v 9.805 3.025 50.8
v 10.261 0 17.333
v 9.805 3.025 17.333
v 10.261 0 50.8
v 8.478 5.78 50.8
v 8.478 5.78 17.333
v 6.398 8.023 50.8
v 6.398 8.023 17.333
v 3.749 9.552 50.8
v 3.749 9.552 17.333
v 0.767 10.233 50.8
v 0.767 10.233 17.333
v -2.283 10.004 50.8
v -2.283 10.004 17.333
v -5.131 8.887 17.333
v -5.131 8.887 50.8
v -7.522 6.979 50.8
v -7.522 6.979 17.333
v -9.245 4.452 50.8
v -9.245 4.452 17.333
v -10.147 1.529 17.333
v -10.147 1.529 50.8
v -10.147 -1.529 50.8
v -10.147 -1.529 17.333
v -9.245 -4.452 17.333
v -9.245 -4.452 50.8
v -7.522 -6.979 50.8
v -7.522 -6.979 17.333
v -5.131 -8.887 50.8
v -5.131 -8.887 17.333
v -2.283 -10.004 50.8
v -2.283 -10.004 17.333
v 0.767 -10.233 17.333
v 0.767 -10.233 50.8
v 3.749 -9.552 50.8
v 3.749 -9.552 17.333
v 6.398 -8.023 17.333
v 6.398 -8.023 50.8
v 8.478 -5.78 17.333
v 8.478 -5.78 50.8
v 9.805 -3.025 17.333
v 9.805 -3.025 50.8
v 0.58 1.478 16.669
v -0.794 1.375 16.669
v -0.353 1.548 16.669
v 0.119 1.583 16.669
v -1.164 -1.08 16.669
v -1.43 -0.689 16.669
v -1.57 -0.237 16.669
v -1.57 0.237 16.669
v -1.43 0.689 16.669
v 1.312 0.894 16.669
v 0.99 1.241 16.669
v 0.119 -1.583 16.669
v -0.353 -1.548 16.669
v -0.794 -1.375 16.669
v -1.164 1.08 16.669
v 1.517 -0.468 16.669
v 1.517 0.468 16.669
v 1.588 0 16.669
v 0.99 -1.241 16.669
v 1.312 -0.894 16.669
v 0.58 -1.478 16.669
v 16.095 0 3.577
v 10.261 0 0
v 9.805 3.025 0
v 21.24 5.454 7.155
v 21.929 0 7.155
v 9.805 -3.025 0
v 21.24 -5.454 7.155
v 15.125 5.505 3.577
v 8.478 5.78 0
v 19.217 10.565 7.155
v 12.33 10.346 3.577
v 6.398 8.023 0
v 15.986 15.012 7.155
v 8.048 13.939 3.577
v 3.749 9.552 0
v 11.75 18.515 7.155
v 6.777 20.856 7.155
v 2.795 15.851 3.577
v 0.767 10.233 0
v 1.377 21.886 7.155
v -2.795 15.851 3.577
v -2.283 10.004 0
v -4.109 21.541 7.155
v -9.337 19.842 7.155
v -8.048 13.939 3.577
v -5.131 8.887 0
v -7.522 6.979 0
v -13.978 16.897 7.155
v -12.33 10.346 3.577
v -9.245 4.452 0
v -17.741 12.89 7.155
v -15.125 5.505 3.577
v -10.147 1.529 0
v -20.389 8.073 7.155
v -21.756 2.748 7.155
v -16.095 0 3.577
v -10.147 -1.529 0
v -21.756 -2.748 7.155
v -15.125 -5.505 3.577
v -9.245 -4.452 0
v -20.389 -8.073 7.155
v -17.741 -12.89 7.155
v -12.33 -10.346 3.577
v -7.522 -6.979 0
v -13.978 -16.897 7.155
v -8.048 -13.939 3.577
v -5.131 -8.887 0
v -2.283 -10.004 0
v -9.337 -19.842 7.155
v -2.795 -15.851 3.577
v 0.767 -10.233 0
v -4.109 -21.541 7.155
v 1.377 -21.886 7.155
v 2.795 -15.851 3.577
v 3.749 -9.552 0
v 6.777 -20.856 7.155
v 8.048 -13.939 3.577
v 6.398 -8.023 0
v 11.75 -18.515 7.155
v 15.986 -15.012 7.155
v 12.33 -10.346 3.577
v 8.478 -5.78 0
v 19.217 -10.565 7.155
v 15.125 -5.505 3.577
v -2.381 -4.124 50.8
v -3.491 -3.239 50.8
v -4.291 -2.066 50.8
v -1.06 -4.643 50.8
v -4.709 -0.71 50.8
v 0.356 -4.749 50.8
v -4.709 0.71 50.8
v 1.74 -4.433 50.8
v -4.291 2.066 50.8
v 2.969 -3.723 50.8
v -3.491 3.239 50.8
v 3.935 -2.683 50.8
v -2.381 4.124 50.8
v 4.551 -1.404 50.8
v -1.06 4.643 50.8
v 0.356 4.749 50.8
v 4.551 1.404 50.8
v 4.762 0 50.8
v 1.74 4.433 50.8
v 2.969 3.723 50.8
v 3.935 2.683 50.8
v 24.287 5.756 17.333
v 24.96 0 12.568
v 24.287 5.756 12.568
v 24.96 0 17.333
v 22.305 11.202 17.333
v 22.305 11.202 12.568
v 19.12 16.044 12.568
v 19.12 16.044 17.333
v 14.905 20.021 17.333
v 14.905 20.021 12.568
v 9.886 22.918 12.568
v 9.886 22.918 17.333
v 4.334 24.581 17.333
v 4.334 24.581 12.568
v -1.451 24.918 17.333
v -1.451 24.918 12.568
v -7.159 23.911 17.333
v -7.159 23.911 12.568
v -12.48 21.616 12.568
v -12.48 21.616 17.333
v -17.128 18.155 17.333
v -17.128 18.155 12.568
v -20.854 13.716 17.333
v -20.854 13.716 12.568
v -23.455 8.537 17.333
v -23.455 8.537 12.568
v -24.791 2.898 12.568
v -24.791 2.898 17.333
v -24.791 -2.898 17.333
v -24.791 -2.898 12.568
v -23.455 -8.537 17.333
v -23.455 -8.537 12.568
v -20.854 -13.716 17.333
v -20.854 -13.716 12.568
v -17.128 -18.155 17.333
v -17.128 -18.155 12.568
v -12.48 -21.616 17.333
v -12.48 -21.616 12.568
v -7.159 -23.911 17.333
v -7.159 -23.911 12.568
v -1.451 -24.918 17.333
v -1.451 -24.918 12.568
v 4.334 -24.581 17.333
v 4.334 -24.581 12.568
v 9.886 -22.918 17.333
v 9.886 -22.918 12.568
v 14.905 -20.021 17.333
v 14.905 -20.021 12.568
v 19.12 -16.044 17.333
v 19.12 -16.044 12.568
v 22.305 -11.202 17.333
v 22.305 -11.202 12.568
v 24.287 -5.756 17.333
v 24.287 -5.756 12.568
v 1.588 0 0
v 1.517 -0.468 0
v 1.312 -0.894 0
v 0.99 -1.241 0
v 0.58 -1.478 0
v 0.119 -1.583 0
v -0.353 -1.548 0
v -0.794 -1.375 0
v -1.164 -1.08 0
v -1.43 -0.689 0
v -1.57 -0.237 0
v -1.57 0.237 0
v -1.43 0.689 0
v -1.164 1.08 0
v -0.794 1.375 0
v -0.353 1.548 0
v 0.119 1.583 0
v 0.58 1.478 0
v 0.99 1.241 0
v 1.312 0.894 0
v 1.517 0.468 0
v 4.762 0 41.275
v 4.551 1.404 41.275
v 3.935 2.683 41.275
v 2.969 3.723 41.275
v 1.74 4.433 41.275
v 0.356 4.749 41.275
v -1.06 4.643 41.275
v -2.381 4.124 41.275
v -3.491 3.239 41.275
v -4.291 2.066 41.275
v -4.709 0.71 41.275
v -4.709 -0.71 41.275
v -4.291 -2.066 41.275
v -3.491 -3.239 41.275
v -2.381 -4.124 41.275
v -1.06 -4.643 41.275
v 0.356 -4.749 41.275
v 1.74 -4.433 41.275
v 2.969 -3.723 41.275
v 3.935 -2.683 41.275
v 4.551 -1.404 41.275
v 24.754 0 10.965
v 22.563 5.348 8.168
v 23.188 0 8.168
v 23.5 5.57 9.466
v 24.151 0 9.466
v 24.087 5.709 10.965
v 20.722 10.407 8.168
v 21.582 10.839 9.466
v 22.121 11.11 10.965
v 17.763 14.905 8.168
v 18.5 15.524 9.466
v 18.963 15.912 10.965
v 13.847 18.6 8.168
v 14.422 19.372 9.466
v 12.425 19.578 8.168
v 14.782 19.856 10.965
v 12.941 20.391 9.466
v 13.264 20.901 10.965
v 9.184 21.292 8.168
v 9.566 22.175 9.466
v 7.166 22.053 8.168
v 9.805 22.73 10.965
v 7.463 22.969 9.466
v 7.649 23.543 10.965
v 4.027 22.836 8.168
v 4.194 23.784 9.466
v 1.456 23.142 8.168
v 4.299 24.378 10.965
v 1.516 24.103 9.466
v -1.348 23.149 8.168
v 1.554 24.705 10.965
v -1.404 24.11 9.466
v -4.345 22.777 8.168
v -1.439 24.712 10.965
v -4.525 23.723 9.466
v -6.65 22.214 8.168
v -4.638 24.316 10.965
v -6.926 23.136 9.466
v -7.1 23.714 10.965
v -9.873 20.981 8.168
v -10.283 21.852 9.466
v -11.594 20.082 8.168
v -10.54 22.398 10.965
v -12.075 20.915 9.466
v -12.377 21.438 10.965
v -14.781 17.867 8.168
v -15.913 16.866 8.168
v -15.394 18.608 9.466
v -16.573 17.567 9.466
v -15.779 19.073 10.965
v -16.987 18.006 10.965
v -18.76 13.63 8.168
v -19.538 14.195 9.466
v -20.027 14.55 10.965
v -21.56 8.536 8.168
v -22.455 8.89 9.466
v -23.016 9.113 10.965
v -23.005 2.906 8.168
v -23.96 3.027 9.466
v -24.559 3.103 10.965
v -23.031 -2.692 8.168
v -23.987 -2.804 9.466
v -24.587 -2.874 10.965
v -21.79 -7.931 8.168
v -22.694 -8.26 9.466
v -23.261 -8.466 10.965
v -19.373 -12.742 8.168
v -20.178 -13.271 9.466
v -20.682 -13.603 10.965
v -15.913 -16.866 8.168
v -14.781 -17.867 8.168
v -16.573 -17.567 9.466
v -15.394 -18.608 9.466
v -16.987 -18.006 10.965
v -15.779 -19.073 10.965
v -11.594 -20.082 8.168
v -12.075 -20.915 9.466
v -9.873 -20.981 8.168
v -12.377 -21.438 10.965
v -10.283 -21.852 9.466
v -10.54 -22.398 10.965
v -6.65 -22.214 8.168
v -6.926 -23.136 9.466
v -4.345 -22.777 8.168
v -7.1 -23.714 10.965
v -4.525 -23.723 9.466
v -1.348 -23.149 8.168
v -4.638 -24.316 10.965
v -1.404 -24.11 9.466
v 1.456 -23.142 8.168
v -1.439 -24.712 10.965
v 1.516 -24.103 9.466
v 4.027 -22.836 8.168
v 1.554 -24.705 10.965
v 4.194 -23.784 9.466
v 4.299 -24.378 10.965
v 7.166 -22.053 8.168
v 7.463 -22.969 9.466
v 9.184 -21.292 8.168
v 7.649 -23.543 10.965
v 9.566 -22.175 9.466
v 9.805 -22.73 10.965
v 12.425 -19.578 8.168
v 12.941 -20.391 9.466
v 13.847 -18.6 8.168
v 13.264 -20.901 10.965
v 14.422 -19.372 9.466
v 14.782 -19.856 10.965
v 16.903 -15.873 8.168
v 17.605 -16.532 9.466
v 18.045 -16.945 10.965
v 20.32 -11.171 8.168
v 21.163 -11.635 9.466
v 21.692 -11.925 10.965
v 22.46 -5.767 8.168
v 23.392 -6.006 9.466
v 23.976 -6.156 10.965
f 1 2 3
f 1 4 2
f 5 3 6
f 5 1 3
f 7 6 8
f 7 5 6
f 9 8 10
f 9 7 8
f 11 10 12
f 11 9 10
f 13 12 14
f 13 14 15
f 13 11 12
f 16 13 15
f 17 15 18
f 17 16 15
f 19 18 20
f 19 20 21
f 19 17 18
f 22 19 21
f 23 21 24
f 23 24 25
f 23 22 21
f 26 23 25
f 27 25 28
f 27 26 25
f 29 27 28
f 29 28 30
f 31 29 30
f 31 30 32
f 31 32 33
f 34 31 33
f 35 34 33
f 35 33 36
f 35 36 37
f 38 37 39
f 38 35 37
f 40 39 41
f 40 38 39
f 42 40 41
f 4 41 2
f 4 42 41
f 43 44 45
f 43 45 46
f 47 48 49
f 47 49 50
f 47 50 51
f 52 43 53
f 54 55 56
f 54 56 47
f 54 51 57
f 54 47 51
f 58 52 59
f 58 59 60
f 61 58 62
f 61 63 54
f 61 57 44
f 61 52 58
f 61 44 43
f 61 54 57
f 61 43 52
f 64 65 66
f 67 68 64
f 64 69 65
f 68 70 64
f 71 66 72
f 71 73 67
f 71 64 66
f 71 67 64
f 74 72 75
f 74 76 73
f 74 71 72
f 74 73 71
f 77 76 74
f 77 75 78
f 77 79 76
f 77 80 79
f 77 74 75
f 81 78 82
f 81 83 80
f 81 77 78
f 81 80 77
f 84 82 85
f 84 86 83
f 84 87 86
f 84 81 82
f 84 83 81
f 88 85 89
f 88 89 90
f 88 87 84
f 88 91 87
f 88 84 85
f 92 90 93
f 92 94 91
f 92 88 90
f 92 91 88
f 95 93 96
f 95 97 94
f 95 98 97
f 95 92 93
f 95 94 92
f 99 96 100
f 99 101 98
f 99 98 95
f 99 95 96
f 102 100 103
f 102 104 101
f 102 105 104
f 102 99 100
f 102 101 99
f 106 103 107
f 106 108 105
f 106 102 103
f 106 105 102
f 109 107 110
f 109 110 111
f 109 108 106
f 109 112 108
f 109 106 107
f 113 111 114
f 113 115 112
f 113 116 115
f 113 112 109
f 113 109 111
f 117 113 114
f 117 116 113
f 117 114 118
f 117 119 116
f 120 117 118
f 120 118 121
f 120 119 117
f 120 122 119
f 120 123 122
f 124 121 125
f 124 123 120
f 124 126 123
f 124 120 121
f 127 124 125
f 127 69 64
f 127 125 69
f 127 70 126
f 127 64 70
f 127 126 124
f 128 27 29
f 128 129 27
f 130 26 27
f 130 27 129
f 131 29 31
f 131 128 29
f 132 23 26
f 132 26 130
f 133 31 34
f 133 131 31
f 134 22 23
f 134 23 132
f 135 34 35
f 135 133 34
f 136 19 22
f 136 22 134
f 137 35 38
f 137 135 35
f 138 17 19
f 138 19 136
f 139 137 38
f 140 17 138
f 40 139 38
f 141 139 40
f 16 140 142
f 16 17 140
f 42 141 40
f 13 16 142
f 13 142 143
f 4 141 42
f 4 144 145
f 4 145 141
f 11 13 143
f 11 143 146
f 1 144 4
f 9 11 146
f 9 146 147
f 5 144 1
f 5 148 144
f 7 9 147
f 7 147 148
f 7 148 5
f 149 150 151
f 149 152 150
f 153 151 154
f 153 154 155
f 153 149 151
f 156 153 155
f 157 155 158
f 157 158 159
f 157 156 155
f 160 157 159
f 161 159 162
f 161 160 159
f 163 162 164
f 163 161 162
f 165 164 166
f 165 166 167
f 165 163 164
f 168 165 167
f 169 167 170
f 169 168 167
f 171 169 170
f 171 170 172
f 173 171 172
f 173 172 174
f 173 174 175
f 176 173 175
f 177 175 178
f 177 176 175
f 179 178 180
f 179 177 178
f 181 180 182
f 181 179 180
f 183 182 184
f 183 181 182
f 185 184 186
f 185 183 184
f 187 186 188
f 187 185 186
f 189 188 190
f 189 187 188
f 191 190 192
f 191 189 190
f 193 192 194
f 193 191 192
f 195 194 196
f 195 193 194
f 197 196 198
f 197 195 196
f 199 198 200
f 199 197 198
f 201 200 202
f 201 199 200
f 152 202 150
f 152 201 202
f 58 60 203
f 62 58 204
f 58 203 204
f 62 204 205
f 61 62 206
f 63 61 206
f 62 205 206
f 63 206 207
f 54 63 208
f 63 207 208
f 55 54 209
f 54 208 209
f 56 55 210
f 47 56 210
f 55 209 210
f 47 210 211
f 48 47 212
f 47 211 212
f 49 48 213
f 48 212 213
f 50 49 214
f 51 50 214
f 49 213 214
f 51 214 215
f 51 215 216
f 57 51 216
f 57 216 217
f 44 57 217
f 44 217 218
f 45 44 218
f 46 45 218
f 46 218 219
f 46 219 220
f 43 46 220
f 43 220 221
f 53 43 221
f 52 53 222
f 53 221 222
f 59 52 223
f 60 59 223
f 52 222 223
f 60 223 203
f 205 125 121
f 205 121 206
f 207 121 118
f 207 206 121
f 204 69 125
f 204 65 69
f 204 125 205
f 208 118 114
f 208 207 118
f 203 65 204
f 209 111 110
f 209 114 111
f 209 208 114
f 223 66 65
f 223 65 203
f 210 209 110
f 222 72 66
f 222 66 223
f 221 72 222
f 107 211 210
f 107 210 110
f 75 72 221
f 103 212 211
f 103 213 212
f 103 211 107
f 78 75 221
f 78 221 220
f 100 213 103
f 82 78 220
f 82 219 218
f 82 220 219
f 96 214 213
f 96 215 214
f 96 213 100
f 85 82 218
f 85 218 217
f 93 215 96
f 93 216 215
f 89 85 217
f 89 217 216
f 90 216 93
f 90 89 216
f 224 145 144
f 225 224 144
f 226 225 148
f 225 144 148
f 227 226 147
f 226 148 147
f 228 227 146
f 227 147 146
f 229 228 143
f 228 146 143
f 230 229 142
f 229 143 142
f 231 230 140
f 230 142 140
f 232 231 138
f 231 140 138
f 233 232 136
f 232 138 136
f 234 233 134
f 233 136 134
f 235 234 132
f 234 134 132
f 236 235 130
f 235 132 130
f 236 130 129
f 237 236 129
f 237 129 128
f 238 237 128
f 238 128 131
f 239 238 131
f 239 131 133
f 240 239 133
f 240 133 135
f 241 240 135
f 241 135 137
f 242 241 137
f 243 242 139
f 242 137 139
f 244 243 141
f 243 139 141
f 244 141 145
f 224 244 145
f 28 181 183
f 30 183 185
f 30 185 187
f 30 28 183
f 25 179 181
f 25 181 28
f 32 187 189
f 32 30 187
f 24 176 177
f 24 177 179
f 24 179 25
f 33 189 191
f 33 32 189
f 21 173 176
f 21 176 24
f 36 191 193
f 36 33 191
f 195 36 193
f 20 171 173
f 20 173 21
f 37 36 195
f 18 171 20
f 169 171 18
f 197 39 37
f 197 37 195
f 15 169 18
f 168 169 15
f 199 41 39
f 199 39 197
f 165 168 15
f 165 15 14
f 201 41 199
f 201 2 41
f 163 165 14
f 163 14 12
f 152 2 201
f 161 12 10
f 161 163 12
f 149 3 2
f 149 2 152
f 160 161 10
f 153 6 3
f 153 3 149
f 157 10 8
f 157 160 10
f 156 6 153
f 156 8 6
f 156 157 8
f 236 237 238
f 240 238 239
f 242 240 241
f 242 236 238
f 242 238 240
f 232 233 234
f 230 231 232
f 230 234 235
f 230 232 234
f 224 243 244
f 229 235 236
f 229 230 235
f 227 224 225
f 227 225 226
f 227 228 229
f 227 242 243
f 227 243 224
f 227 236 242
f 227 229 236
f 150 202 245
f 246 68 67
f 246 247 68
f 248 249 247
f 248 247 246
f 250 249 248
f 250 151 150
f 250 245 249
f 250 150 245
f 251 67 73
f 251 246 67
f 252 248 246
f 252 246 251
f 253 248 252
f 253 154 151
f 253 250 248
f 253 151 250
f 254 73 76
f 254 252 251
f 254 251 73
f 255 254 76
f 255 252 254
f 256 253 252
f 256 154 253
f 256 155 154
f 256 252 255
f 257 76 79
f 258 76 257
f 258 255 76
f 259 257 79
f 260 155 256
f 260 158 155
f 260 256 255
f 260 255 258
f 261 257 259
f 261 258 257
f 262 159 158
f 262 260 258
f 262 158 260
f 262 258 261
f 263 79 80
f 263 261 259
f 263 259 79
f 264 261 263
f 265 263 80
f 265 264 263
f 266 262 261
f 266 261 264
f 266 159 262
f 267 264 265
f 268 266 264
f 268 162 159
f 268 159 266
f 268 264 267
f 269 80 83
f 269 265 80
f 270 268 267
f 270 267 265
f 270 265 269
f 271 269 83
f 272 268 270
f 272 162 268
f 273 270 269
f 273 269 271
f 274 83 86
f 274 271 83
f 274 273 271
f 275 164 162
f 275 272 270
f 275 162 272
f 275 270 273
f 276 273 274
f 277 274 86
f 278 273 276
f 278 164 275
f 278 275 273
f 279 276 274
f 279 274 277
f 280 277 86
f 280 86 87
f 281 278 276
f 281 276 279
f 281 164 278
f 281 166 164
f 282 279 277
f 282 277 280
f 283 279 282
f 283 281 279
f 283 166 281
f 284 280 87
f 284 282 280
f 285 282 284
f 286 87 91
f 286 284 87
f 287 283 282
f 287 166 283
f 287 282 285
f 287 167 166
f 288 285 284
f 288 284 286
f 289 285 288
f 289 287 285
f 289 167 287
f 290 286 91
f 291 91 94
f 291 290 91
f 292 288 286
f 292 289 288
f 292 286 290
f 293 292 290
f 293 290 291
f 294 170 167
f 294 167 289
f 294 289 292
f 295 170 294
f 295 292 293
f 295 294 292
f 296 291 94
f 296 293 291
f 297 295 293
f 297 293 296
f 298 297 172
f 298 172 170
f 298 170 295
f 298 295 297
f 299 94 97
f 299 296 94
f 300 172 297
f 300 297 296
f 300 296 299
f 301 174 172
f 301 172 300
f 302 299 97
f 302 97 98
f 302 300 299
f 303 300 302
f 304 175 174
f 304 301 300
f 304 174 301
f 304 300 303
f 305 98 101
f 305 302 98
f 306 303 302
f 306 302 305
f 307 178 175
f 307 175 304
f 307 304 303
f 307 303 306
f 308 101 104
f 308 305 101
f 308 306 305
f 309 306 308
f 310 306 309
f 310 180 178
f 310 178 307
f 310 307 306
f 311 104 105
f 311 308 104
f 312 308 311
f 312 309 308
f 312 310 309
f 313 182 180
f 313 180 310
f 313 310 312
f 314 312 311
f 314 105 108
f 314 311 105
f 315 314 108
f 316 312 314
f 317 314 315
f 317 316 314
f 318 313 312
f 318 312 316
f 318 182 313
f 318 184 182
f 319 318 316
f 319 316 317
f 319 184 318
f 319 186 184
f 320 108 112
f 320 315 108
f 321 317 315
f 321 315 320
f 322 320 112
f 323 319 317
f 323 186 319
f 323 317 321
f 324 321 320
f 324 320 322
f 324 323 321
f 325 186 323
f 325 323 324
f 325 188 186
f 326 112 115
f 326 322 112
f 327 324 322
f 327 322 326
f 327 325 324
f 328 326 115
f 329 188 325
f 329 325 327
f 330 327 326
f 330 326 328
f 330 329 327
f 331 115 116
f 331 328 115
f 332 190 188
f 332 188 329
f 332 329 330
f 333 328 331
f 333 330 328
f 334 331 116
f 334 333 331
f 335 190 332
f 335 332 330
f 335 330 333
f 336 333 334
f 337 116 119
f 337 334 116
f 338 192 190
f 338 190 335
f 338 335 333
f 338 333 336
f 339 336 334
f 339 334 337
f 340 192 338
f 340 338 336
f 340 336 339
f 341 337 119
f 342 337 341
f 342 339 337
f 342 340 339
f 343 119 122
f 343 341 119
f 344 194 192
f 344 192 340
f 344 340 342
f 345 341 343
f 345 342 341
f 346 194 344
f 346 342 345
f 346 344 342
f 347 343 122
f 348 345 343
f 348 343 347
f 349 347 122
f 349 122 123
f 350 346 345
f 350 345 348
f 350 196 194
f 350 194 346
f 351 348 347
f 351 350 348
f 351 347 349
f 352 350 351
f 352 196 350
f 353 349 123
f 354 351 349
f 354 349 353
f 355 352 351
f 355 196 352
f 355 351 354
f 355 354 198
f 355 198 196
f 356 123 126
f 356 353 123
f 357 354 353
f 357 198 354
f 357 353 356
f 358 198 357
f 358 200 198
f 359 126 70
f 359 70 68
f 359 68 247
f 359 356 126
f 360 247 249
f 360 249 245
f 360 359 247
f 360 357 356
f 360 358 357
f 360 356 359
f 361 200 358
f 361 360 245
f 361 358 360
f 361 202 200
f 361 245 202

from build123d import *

# Parameters (mm, degrees)
F2_R     = 4.7625
F3_DEPTH = 9.525
F4_R     = 1.5875
F5_DEPTH = 16.66875


with BuildPart() as f1:
    # F0 (on Front) → F1 (revolve)
    with BuildSketch(Plane.XZ):
        with BuildLine():
            Line((0, 50.8), (0, 0))
            Line((0, 0), (10.261248, 0))
            Line((10.261248, 0), (21.929258, 7.154912))
            ThreePointArc((21.929258, 7.154912), (24.1506, 9.46627), (24.959791, 12.568196))
            Line((24.959791, 12.568196), (24.959791, 17.333189))
            Line((24.959791, 17.333189), (10.261248, 17.333189))
            Line((10.261248, 17.333189), (10.261248, 50.8))
            Line((10.261248, 50.8), (0, 50.8))
        make_face()
    revolve(axis=Axis((0, 0, 25.4), (0, 0, 1)))

    # F2 (on face) → F3 (cut)
    with BuildSketch(Plane.XY.offset(50.8)):
        Circle(F2_R)
    extrude(amount=-F3_DEPTH, mode=Mode.SUBTRACT)

    # F4 (on face) → F5 (cut)
    with BuildSketch(Plane(origin=(0, 0, 0), x_dir=(1, 0, 0), z_dir=(0, 0, -1))):
        Circle(F4_R)
    extrude(amount=-F5_DEPTH, mode=Mode.SUBTRACT)


solid = f1.part
